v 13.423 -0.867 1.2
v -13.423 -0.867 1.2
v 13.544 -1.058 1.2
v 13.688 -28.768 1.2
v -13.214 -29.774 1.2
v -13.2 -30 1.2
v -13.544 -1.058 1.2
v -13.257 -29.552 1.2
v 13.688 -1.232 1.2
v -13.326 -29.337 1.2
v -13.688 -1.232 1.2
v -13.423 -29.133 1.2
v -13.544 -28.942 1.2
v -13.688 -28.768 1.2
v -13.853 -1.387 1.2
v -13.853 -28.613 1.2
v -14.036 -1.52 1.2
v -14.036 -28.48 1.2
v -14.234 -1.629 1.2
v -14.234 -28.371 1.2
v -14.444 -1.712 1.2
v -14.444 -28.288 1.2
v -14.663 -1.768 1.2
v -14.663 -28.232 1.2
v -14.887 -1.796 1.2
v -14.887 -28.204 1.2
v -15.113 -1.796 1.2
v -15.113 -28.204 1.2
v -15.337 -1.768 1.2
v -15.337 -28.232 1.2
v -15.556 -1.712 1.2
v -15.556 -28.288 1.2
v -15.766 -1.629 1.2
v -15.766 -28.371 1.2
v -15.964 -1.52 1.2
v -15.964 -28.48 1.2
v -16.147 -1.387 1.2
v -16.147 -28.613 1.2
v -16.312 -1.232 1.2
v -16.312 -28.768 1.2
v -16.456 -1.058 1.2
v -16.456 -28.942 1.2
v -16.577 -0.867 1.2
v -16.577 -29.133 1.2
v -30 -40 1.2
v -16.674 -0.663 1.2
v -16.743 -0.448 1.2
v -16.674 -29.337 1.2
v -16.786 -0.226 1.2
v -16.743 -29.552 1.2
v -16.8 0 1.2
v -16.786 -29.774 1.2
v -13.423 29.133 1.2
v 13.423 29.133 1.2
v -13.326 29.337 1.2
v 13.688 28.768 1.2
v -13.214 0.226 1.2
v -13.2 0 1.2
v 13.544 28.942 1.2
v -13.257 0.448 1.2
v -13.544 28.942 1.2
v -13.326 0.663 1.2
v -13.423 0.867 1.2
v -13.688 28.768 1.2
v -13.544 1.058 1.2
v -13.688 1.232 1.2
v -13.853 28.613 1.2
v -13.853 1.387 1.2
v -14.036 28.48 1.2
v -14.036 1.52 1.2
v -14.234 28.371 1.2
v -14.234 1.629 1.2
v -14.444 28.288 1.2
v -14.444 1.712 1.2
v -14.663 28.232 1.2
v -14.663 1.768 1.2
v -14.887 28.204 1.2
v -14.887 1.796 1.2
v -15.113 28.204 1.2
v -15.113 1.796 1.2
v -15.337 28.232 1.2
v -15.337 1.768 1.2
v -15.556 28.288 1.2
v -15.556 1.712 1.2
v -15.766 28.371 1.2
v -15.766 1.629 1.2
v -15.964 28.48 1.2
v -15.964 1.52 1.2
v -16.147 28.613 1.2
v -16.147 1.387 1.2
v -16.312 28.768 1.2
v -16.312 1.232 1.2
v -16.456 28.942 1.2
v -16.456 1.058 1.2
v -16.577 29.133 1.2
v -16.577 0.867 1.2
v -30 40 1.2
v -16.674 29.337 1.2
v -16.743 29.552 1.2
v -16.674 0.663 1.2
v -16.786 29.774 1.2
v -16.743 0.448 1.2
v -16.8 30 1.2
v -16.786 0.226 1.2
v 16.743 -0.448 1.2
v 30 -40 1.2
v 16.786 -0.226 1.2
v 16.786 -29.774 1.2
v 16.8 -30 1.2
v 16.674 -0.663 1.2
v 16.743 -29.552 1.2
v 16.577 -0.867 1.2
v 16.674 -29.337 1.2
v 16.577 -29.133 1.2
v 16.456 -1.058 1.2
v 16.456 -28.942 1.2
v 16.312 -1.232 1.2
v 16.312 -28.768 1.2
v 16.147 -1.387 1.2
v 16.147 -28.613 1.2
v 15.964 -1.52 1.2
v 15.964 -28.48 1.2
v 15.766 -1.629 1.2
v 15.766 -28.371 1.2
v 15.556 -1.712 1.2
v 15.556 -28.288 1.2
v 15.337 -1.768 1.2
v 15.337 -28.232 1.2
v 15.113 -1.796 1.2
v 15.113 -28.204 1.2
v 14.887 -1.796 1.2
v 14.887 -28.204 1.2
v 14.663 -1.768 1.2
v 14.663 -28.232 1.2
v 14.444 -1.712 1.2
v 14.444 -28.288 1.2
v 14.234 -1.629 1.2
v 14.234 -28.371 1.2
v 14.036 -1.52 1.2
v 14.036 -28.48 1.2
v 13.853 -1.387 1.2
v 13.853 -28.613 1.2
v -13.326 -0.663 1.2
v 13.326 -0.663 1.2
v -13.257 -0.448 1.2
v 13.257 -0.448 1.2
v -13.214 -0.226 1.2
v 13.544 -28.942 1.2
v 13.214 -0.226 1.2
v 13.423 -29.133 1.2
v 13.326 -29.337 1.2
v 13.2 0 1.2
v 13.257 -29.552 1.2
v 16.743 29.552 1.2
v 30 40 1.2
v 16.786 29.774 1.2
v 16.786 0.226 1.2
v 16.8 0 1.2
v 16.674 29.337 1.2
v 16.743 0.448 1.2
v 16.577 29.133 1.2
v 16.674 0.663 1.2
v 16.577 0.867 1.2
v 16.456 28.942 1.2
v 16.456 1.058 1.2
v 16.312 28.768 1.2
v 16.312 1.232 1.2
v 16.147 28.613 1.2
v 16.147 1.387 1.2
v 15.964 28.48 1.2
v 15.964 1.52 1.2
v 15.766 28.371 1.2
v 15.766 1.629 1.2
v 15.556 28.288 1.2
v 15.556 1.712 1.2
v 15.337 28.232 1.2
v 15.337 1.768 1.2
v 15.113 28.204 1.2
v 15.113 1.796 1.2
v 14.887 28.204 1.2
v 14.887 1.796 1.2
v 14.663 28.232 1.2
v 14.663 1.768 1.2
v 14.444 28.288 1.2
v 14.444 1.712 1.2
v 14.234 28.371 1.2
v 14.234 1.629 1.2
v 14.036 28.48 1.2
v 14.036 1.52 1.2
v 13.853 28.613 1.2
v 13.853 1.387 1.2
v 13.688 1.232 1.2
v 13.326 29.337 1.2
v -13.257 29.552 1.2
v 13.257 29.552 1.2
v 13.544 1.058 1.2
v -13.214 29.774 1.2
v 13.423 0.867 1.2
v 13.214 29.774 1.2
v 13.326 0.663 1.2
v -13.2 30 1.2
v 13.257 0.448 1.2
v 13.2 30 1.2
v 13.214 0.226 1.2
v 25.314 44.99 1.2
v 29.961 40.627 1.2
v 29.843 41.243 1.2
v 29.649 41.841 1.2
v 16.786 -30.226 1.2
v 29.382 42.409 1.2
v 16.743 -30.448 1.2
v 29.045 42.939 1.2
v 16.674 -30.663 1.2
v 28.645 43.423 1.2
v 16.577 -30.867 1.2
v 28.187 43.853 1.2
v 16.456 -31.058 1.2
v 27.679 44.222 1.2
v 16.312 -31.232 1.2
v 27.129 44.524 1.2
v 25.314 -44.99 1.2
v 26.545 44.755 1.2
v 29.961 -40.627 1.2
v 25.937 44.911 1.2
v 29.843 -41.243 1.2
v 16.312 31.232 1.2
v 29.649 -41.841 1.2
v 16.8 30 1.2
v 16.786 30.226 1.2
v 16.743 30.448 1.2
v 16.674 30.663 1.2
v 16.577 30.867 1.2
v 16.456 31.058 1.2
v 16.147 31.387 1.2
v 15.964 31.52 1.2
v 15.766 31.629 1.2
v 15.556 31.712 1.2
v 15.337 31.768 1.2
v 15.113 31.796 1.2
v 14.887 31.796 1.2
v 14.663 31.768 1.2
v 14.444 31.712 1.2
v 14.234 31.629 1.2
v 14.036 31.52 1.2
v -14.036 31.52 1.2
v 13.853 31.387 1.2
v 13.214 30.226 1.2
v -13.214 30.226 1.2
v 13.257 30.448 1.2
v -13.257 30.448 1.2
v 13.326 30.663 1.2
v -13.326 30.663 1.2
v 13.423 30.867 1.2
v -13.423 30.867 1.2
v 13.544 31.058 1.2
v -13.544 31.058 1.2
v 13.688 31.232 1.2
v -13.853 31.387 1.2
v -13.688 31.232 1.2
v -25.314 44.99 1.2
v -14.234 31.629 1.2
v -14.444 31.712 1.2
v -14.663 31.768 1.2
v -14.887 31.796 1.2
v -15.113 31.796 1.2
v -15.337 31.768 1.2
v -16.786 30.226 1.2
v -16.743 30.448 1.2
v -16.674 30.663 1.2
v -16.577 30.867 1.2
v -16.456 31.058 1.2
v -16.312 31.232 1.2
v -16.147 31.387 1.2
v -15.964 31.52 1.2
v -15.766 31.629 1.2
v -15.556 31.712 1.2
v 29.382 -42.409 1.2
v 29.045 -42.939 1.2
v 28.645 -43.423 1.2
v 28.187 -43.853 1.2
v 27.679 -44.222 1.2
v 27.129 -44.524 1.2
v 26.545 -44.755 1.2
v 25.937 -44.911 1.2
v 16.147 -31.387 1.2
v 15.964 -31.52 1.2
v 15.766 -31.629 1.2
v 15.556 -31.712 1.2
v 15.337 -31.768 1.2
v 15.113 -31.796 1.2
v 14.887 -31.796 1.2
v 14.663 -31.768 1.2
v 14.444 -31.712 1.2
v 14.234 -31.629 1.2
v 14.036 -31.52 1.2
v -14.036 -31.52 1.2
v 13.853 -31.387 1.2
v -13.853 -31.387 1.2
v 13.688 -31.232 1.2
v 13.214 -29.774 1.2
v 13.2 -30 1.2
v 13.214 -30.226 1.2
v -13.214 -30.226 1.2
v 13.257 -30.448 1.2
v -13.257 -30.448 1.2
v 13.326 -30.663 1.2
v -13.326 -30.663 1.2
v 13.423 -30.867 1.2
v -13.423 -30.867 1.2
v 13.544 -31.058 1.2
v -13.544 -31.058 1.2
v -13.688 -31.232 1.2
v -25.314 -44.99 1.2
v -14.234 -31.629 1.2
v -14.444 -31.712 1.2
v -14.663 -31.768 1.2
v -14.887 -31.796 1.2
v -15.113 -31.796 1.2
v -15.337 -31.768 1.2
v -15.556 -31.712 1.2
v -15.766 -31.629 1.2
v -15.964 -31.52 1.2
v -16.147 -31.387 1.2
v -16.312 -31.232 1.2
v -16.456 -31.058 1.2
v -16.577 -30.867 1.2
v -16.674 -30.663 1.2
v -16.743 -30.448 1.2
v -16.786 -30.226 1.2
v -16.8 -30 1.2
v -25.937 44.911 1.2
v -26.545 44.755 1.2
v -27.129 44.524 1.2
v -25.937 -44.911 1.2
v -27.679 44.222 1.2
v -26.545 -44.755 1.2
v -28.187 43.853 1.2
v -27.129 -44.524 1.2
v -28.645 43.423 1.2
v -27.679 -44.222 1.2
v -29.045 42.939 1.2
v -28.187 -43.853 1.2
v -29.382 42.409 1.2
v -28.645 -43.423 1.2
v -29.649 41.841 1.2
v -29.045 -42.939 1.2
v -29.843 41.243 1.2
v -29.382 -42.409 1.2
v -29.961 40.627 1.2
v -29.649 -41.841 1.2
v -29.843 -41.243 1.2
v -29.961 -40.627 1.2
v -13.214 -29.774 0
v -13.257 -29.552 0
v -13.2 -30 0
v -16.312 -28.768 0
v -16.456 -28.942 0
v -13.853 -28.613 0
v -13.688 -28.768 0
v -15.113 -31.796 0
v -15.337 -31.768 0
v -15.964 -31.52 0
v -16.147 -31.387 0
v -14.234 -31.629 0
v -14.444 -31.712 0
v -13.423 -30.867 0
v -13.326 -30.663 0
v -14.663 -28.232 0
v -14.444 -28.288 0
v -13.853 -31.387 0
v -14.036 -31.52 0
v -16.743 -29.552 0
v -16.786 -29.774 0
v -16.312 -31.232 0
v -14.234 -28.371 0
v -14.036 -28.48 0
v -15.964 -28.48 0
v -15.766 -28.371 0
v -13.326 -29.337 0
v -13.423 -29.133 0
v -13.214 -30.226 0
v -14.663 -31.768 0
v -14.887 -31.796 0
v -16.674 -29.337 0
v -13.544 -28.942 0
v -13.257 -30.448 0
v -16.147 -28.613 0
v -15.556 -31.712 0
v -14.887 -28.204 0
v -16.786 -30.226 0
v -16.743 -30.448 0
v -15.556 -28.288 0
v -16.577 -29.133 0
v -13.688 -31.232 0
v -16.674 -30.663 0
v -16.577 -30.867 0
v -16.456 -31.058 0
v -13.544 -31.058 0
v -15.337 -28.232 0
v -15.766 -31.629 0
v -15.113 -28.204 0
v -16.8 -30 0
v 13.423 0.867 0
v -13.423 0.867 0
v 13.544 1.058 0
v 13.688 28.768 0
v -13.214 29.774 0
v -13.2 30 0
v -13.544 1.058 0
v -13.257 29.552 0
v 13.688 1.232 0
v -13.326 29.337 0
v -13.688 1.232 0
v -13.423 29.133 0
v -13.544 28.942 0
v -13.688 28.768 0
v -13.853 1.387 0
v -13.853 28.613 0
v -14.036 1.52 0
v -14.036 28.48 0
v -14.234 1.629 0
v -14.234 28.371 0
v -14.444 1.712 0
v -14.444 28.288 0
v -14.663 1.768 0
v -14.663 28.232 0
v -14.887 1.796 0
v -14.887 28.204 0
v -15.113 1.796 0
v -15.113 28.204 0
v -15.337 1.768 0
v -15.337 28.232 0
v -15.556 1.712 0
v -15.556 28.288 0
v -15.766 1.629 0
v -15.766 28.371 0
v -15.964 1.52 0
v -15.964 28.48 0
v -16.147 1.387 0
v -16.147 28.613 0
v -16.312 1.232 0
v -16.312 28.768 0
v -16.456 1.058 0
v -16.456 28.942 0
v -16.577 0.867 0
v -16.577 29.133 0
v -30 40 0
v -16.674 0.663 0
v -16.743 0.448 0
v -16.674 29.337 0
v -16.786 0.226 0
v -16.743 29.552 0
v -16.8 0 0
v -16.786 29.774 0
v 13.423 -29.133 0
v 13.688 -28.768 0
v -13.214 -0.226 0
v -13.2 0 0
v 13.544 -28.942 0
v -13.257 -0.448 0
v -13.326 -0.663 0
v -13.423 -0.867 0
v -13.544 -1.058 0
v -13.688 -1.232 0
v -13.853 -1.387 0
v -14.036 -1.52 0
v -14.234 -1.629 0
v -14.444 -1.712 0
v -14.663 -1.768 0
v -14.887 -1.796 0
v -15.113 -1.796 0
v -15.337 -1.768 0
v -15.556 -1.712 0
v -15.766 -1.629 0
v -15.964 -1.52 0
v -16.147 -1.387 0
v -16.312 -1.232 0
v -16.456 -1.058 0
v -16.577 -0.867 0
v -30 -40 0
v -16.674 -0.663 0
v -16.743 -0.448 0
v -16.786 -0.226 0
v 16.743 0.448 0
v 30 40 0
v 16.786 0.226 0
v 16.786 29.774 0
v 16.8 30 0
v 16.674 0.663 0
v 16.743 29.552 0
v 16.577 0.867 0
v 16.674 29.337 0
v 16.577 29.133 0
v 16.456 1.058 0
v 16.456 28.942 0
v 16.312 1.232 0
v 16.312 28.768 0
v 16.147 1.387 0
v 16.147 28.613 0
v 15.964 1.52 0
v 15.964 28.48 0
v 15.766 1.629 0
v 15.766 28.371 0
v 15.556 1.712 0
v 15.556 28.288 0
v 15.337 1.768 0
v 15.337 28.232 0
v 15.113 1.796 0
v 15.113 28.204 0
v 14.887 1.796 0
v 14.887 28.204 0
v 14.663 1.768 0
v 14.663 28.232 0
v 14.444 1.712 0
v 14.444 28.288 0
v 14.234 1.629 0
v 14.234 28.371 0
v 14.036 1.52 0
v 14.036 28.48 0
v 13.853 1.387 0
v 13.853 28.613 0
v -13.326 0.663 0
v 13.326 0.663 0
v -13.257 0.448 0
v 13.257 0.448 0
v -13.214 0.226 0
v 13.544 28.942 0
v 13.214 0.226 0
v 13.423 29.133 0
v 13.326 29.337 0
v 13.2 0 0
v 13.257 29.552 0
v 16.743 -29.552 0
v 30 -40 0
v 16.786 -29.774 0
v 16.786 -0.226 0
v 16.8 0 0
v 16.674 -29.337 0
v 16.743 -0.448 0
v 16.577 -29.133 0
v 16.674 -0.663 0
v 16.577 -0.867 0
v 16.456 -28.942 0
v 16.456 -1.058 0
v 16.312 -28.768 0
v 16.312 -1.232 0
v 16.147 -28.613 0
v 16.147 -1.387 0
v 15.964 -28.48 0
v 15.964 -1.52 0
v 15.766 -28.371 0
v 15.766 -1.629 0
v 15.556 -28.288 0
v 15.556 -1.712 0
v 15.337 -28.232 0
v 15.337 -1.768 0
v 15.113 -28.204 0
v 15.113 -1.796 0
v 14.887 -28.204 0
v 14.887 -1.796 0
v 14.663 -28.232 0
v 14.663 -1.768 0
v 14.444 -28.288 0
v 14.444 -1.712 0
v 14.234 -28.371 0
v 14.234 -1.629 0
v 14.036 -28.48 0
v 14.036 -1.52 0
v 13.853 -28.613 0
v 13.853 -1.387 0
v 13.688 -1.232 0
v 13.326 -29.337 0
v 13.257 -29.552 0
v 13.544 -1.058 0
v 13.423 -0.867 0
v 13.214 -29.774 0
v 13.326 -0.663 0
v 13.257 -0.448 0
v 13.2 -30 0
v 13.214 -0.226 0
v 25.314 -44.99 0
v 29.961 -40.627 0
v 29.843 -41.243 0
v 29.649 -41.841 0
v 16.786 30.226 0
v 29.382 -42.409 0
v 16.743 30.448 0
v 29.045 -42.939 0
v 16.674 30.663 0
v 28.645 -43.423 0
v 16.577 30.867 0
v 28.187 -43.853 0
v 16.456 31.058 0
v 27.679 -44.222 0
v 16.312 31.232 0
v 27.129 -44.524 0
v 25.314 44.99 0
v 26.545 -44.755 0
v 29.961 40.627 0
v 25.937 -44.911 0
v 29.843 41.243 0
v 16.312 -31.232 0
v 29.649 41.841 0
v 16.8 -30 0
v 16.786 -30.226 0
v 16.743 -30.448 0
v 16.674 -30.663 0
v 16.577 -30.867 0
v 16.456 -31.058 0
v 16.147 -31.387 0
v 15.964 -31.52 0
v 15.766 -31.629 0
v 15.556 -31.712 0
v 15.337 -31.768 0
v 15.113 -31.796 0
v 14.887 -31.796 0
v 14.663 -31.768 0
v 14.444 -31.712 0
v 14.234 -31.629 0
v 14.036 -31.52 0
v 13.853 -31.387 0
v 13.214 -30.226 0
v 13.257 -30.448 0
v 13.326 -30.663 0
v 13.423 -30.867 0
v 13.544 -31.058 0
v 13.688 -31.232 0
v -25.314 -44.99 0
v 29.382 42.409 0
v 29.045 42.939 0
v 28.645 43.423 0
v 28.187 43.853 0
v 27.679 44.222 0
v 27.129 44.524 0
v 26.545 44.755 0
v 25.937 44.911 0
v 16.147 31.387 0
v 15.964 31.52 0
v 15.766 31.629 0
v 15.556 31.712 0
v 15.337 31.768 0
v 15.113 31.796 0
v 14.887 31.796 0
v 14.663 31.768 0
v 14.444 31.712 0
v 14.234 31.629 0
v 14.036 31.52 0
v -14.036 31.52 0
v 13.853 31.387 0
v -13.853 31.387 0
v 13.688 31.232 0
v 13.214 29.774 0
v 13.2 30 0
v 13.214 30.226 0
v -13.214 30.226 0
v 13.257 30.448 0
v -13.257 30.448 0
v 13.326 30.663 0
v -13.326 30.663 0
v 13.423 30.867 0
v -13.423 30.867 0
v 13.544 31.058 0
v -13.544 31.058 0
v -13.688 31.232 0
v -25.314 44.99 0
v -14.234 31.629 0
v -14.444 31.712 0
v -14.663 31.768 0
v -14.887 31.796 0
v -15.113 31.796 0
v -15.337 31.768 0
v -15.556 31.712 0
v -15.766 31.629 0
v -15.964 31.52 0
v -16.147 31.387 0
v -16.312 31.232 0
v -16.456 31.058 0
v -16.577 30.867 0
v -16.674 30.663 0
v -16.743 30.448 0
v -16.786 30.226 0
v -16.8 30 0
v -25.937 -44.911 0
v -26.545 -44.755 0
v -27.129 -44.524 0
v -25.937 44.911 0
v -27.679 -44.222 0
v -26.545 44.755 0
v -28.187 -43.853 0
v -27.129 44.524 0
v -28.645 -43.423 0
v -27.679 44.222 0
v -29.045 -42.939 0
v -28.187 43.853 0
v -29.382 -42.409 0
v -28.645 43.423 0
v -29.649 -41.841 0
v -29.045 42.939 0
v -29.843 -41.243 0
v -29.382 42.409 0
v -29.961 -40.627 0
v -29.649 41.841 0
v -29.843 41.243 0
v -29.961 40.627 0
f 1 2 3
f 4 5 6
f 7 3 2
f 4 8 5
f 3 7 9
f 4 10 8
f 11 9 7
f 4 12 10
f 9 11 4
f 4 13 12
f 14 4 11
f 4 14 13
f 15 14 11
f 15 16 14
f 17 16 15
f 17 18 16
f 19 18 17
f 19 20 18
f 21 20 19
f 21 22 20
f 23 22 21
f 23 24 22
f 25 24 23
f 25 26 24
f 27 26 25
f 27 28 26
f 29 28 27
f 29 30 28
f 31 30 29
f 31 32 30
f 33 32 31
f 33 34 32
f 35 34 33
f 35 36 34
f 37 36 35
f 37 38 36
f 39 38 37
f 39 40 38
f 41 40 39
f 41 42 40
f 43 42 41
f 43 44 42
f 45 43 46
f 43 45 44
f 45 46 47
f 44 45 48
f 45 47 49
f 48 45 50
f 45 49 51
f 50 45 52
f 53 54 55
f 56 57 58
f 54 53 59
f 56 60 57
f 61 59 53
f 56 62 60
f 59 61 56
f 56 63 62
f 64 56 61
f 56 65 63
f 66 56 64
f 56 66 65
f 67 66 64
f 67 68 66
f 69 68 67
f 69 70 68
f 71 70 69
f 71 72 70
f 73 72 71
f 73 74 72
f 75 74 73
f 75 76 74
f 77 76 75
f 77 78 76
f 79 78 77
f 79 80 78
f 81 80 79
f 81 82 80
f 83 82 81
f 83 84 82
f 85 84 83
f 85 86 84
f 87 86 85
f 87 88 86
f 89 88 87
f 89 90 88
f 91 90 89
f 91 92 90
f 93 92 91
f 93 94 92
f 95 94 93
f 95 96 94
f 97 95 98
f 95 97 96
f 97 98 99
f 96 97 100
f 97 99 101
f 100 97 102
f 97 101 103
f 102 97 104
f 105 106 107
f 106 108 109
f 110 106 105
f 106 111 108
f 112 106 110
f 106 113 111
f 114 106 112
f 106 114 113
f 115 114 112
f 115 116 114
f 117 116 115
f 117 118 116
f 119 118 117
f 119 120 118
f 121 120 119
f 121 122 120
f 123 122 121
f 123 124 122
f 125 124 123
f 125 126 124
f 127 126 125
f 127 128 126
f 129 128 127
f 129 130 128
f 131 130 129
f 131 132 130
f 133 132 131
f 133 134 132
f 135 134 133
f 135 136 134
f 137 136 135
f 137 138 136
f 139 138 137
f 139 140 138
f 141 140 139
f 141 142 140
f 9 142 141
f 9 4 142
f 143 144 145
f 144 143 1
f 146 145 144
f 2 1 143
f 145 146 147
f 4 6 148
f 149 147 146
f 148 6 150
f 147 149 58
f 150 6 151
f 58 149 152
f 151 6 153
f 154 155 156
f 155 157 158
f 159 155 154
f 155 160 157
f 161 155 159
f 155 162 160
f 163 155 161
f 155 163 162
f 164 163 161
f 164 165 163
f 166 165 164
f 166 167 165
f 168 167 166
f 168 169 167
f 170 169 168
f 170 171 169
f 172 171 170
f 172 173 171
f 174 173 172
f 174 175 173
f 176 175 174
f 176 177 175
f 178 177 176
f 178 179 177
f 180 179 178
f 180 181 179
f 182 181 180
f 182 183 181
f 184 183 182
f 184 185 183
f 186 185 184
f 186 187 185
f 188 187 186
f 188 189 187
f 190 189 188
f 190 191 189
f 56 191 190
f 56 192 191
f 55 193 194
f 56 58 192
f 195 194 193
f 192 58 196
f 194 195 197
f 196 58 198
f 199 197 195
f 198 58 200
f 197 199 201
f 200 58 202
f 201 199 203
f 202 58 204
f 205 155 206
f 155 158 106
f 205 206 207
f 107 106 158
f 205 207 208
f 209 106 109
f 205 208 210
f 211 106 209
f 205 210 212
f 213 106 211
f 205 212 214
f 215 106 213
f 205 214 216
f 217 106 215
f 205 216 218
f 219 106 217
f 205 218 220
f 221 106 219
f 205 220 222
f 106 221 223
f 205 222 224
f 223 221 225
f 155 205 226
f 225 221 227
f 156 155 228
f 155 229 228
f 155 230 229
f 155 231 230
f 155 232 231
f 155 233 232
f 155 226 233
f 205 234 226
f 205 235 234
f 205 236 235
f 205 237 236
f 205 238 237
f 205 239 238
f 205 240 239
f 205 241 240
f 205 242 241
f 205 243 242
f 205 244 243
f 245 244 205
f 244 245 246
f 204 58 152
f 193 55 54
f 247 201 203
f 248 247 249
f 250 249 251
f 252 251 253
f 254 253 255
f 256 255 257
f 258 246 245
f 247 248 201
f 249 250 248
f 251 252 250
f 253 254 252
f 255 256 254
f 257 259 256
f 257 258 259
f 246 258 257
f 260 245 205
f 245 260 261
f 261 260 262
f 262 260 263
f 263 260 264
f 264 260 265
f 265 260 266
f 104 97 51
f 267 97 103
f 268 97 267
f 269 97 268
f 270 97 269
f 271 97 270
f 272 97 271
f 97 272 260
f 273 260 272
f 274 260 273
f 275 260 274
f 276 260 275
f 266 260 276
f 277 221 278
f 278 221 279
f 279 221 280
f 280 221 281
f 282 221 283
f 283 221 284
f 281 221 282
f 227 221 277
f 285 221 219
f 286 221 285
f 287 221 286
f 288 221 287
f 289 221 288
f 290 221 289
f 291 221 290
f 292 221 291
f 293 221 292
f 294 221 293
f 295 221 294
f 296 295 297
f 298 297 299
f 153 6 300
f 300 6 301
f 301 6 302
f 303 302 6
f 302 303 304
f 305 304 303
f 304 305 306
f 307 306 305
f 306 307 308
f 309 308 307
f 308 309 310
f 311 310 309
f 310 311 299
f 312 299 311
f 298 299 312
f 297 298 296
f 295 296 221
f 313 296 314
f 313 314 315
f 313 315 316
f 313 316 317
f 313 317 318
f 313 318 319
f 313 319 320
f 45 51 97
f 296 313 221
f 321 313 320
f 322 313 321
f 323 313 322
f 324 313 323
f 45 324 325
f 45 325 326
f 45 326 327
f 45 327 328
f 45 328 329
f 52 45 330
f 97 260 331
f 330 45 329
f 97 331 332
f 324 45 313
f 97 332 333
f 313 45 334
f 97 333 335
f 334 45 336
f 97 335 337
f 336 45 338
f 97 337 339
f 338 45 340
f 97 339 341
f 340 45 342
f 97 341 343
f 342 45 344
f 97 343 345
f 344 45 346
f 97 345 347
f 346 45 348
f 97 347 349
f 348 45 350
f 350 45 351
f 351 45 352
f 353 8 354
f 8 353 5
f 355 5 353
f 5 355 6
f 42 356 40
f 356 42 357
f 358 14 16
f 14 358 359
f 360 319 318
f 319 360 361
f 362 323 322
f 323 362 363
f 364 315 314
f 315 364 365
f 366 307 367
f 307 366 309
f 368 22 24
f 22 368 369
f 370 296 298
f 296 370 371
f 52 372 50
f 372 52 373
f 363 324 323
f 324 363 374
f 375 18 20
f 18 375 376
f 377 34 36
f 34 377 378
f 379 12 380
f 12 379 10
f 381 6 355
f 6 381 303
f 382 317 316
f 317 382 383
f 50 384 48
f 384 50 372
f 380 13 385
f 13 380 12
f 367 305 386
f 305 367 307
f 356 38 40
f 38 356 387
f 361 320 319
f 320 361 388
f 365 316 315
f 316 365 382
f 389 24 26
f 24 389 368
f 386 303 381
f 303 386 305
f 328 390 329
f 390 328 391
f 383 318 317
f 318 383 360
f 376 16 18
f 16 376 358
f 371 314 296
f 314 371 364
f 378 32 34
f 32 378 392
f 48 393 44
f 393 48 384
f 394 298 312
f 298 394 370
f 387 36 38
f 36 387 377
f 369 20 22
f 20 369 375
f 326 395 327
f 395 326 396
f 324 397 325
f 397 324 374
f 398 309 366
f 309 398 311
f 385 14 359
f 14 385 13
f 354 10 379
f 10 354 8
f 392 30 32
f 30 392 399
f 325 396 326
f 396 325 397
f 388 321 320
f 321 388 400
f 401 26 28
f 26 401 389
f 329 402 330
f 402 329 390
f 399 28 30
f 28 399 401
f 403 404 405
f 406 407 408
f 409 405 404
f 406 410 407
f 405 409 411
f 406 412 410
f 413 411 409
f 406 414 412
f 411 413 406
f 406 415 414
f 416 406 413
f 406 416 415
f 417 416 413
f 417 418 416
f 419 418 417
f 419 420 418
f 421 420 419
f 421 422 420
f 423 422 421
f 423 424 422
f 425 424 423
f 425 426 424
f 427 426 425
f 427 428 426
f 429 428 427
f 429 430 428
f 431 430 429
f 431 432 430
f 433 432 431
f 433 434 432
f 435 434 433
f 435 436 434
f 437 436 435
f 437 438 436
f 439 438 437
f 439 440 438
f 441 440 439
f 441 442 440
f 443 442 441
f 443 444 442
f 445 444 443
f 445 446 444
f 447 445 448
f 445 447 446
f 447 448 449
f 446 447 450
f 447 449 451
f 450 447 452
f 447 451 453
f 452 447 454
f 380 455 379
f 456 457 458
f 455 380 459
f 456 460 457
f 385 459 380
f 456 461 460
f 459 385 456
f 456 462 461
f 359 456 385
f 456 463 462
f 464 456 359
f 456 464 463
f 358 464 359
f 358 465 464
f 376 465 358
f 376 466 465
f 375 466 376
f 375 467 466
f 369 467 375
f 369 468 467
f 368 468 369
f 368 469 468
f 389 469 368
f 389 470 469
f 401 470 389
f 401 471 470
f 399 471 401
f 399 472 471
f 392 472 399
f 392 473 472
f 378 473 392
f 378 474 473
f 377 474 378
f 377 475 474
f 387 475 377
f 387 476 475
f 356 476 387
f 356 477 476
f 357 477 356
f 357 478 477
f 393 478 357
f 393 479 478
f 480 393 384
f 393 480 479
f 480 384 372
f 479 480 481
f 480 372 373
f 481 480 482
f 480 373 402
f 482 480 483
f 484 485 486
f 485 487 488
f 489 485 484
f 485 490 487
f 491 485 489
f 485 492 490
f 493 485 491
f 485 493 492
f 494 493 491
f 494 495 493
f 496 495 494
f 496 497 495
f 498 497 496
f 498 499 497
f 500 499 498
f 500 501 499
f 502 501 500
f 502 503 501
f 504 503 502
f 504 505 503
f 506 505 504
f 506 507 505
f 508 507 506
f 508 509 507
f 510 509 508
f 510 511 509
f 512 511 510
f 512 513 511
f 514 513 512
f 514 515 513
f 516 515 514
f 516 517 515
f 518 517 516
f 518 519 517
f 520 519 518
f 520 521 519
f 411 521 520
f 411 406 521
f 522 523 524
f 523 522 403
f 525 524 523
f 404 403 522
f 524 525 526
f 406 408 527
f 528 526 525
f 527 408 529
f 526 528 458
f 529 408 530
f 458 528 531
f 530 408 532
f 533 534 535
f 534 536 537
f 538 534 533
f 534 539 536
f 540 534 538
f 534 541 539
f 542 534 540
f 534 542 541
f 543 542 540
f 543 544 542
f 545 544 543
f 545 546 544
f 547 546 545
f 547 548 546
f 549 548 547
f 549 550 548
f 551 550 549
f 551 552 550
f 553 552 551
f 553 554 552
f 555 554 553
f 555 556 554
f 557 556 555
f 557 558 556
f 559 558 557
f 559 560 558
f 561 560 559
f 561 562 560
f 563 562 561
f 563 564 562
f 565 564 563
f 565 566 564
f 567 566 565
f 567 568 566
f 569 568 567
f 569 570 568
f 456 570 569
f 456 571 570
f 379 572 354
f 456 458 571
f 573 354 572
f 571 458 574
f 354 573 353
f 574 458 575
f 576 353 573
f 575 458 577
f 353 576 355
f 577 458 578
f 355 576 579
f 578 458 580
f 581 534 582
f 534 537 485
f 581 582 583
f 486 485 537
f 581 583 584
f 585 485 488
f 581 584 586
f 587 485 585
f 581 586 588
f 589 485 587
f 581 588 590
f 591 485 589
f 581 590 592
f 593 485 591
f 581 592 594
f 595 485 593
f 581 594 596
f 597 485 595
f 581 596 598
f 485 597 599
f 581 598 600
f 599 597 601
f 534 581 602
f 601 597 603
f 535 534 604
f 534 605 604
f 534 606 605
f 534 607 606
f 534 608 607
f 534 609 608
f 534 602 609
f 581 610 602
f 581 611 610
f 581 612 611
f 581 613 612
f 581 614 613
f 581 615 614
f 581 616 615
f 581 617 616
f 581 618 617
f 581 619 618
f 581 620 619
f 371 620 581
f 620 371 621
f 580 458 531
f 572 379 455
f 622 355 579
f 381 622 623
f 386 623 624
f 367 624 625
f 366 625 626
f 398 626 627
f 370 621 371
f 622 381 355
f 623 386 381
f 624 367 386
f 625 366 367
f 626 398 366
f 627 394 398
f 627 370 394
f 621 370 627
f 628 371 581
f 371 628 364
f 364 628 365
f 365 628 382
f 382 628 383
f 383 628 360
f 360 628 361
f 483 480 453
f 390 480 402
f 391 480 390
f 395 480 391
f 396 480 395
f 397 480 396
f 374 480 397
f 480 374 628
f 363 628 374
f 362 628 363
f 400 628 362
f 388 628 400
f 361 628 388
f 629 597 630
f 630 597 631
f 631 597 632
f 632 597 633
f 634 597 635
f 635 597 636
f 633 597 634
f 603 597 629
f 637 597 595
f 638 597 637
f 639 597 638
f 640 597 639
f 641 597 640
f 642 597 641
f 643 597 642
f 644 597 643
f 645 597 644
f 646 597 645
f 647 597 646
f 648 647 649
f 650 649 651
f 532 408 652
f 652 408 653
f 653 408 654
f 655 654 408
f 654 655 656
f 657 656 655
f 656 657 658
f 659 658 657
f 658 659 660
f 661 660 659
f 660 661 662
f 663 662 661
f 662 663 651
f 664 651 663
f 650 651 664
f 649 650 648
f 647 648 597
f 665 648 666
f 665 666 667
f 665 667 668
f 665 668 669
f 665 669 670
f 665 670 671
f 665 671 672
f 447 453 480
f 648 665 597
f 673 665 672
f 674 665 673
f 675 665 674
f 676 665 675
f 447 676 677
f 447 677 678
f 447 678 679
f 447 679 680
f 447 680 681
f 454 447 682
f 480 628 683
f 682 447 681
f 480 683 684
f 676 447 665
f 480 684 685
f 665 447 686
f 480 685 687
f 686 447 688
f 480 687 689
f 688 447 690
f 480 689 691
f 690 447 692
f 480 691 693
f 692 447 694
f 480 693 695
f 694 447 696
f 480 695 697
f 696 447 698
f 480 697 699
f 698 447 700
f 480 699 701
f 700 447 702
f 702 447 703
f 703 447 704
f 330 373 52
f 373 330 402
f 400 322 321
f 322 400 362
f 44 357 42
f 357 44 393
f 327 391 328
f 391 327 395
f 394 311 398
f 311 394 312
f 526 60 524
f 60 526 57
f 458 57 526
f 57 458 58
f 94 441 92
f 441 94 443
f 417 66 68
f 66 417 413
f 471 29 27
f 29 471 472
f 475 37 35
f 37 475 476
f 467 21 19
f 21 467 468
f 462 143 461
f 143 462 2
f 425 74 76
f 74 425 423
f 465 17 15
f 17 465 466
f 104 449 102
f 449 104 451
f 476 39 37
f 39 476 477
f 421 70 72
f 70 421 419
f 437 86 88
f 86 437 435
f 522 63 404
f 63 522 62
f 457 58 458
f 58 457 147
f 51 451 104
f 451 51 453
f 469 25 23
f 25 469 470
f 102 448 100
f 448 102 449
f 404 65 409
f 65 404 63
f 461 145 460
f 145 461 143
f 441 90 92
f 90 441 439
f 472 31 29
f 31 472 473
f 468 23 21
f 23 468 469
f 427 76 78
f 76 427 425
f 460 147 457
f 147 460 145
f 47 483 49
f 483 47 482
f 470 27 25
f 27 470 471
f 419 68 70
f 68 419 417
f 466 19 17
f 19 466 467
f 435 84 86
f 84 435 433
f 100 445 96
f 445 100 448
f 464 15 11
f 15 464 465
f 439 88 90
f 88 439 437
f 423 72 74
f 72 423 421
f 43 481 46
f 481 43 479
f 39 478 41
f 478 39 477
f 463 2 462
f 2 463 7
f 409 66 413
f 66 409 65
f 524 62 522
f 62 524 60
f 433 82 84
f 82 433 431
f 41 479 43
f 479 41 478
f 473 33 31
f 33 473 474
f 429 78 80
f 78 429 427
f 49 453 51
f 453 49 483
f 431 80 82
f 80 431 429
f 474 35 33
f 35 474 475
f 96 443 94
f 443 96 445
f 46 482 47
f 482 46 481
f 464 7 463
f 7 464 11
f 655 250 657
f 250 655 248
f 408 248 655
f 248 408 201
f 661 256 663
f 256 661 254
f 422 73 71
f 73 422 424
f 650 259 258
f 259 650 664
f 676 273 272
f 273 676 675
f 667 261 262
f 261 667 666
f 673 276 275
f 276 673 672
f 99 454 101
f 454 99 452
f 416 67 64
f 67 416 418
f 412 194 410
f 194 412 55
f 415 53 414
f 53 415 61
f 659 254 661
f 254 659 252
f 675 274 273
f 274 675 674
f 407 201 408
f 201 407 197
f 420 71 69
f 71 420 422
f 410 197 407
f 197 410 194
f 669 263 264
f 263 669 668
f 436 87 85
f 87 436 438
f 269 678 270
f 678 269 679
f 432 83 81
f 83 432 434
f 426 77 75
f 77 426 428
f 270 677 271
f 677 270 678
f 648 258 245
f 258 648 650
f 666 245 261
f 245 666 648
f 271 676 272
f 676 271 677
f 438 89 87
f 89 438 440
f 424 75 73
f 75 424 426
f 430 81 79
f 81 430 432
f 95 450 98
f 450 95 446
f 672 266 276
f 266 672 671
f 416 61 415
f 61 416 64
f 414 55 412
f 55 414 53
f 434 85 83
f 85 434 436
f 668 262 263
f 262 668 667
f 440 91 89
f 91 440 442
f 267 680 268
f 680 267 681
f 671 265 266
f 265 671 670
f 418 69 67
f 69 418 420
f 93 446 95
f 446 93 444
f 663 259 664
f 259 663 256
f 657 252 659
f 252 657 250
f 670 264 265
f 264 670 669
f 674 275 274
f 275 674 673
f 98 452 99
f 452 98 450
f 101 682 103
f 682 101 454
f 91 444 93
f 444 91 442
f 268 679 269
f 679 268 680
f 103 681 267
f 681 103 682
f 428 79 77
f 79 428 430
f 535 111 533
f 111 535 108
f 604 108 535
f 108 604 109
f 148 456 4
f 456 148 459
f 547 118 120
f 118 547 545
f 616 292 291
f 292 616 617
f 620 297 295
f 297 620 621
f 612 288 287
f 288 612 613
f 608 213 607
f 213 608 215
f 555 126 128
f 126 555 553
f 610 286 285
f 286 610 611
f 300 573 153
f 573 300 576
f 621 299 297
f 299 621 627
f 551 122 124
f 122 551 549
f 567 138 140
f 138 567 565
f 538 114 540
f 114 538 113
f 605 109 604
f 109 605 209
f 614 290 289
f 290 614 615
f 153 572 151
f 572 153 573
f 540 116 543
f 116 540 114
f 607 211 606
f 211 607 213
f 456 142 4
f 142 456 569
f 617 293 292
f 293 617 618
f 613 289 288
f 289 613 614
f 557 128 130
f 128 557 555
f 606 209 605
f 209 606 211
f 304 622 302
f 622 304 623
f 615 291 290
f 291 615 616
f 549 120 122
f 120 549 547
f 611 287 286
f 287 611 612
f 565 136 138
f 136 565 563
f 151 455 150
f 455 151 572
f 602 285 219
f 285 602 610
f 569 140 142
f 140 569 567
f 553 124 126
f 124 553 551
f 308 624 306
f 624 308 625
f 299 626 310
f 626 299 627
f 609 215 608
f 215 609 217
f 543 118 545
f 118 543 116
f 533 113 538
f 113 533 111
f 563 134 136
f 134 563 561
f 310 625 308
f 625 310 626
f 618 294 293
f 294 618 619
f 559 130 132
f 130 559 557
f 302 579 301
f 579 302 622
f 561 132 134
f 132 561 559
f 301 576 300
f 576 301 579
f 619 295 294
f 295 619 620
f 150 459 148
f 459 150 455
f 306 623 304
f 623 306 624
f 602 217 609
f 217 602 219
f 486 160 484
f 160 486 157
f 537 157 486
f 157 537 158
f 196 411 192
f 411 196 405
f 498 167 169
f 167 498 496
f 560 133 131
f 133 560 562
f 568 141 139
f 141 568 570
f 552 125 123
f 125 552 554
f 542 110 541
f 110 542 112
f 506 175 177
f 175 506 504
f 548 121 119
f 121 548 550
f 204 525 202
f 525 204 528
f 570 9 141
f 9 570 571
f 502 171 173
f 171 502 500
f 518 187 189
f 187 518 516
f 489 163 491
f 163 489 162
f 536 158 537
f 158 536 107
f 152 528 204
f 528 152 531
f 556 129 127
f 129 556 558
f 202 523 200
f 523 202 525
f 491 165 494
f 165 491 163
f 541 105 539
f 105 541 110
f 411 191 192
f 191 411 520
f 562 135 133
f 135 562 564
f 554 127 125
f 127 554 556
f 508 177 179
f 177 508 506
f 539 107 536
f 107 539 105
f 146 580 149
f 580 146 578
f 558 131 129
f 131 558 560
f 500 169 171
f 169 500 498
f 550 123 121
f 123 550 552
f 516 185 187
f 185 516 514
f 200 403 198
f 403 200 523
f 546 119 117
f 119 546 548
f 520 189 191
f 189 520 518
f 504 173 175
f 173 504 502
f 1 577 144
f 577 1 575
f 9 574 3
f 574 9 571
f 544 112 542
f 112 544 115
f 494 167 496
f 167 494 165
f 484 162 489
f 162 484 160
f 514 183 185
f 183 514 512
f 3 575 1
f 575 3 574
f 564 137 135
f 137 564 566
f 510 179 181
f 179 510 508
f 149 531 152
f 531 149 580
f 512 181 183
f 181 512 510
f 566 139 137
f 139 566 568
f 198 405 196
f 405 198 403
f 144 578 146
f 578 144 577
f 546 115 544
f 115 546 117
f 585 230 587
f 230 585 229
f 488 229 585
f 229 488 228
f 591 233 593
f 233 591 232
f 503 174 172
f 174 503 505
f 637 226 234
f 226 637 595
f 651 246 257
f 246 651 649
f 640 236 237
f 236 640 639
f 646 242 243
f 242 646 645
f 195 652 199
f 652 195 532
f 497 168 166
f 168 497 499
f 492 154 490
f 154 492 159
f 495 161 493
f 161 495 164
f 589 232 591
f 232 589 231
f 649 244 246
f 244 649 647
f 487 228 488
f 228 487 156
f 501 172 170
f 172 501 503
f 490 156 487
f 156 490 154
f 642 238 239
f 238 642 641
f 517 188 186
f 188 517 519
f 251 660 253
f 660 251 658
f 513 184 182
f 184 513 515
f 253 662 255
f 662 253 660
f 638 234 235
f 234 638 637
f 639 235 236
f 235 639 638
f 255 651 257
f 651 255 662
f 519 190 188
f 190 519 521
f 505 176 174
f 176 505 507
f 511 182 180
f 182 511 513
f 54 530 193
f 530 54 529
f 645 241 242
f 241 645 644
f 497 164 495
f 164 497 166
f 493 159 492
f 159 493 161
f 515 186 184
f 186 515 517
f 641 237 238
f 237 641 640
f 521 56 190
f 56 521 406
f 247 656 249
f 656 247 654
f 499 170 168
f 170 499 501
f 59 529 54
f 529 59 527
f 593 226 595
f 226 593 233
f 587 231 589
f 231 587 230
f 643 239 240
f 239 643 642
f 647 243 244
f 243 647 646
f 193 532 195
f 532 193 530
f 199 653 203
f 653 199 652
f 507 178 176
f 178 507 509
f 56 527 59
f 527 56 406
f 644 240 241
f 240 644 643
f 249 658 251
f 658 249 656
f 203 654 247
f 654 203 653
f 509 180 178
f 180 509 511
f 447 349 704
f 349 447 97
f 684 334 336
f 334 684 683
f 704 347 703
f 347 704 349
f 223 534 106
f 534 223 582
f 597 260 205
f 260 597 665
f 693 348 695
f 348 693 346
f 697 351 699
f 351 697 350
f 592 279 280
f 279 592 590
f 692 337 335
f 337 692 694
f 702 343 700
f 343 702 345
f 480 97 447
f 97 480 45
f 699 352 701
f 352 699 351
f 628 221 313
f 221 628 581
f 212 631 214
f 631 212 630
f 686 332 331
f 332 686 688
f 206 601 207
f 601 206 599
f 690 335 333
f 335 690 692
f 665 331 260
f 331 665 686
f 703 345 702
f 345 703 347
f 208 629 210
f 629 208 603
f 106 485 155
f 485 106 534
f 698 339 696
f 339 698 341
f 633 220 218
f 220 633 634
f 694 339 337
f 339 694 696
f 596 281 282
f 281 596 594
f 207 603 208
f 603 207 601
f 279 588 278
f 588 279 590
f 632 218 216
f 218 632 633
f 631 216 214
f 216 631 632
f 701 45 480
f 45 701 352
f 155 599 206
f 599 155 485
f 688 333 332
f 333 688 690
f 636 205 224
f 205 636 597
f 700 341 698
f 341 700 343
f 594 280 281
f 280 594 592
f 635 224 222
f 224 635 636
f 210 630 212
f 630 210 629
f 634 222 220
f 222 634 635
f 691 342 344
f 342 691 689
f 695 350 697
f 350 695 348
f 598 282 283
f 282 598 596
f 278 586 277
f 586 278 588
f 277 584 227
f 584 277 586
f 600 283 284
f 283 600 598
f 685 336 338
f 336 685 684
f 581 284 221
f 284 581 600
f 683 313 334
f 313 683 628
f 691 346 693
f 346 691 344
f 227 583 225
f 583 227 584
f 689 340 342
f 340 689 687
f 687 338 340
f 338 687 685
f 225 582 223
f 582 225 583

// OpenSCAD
$fn = 50;


difference() {
	union() {
		hull() {
			translate(v = [-25.0000000000, 40.0000000000, 0]) {
				cylinder(h = 60, r = 5);
			}
			translate(v = [25.0000000000, 40.0000000000, 0]) {
				cylinder(h = 60, r = 5);
			}
			translate(v = [-25.0000000000, -40.0000000000, 0]) {
				cylinder(h = 60, r = 5);
			}
			translate(v = [25.0000000000, -40.0000000000, 0]) {
				cylinder(h = 60, r = 5);
			}
		}
	}
	union() {
		translate(v = [0, 0, 1.2000000000]) {
			hull() {
				translate(v = [-25.0000000000, 40.0000000000, 0]) {
					cylinder(h = 58.8000000000, r = 3.8000000000);
				}
				translate(v = [25.0000000000, 40.0000000000, 0]) {
					cylinder(h = 58.8000000000, r = 3.8000000000);
				}
				translate(v = [-25.0000000000, -40.0000000000, 0]) {
					cylinder(h = 58.8000000000, r = 3.8000000000);
				}
				translate(v = [25.0000000000, -40.0000000000, 0]) {
					cylinder(h = 58.8000000000, r = 3.8000000000);
				}
			}
		}
		#translate(v = [-15.0000000000, -30.0000000000, 0]) {
			cylinder(h = 1.2000000000, r = 1.8000000000);
		}
		#translate(v = [-15.0000000000, 0.0000000000, 0]) {
			cylinder(h = 1.2000000000, r = 1.8000000000);
		}
		#translate(v = [-15.0000000000, 30.0000000000, 0]) {
			cylinder(h = 1.2000000000, r = 1.8000000000);
		}
		#translate(v = [15.0000000000, -30.0000000000, 0]) {
			cylinder(h = 1.2000000000, r = 1.8000000000);
		}
		#translate(v = [15.0000000000, 0.0000000000, 0]) {
			cylinder(h = 1.2000000000, r = 1.8000000000);
		}
		#translate(v = [15.0000000000, 30.0000000000, 0]) {
			cylinder(h = 1.2000000000, r = 1.8000000000);
		}
		translate(v = [-250.0000000000, -250.0000000000, 1.2000000000]) {
			cube(size = [500, 500, 500]);
		}
		translate(v = [-250.0000000000, -250.0000000000, 1.2000000000]) {
			cube(size = [500, 500, 500]);
		}
		translate(v = [-250.0000000000, -250.0000000000, 1.2000000000]) {
			cube(size = [500, 500, 500]);
		}
	}
}
